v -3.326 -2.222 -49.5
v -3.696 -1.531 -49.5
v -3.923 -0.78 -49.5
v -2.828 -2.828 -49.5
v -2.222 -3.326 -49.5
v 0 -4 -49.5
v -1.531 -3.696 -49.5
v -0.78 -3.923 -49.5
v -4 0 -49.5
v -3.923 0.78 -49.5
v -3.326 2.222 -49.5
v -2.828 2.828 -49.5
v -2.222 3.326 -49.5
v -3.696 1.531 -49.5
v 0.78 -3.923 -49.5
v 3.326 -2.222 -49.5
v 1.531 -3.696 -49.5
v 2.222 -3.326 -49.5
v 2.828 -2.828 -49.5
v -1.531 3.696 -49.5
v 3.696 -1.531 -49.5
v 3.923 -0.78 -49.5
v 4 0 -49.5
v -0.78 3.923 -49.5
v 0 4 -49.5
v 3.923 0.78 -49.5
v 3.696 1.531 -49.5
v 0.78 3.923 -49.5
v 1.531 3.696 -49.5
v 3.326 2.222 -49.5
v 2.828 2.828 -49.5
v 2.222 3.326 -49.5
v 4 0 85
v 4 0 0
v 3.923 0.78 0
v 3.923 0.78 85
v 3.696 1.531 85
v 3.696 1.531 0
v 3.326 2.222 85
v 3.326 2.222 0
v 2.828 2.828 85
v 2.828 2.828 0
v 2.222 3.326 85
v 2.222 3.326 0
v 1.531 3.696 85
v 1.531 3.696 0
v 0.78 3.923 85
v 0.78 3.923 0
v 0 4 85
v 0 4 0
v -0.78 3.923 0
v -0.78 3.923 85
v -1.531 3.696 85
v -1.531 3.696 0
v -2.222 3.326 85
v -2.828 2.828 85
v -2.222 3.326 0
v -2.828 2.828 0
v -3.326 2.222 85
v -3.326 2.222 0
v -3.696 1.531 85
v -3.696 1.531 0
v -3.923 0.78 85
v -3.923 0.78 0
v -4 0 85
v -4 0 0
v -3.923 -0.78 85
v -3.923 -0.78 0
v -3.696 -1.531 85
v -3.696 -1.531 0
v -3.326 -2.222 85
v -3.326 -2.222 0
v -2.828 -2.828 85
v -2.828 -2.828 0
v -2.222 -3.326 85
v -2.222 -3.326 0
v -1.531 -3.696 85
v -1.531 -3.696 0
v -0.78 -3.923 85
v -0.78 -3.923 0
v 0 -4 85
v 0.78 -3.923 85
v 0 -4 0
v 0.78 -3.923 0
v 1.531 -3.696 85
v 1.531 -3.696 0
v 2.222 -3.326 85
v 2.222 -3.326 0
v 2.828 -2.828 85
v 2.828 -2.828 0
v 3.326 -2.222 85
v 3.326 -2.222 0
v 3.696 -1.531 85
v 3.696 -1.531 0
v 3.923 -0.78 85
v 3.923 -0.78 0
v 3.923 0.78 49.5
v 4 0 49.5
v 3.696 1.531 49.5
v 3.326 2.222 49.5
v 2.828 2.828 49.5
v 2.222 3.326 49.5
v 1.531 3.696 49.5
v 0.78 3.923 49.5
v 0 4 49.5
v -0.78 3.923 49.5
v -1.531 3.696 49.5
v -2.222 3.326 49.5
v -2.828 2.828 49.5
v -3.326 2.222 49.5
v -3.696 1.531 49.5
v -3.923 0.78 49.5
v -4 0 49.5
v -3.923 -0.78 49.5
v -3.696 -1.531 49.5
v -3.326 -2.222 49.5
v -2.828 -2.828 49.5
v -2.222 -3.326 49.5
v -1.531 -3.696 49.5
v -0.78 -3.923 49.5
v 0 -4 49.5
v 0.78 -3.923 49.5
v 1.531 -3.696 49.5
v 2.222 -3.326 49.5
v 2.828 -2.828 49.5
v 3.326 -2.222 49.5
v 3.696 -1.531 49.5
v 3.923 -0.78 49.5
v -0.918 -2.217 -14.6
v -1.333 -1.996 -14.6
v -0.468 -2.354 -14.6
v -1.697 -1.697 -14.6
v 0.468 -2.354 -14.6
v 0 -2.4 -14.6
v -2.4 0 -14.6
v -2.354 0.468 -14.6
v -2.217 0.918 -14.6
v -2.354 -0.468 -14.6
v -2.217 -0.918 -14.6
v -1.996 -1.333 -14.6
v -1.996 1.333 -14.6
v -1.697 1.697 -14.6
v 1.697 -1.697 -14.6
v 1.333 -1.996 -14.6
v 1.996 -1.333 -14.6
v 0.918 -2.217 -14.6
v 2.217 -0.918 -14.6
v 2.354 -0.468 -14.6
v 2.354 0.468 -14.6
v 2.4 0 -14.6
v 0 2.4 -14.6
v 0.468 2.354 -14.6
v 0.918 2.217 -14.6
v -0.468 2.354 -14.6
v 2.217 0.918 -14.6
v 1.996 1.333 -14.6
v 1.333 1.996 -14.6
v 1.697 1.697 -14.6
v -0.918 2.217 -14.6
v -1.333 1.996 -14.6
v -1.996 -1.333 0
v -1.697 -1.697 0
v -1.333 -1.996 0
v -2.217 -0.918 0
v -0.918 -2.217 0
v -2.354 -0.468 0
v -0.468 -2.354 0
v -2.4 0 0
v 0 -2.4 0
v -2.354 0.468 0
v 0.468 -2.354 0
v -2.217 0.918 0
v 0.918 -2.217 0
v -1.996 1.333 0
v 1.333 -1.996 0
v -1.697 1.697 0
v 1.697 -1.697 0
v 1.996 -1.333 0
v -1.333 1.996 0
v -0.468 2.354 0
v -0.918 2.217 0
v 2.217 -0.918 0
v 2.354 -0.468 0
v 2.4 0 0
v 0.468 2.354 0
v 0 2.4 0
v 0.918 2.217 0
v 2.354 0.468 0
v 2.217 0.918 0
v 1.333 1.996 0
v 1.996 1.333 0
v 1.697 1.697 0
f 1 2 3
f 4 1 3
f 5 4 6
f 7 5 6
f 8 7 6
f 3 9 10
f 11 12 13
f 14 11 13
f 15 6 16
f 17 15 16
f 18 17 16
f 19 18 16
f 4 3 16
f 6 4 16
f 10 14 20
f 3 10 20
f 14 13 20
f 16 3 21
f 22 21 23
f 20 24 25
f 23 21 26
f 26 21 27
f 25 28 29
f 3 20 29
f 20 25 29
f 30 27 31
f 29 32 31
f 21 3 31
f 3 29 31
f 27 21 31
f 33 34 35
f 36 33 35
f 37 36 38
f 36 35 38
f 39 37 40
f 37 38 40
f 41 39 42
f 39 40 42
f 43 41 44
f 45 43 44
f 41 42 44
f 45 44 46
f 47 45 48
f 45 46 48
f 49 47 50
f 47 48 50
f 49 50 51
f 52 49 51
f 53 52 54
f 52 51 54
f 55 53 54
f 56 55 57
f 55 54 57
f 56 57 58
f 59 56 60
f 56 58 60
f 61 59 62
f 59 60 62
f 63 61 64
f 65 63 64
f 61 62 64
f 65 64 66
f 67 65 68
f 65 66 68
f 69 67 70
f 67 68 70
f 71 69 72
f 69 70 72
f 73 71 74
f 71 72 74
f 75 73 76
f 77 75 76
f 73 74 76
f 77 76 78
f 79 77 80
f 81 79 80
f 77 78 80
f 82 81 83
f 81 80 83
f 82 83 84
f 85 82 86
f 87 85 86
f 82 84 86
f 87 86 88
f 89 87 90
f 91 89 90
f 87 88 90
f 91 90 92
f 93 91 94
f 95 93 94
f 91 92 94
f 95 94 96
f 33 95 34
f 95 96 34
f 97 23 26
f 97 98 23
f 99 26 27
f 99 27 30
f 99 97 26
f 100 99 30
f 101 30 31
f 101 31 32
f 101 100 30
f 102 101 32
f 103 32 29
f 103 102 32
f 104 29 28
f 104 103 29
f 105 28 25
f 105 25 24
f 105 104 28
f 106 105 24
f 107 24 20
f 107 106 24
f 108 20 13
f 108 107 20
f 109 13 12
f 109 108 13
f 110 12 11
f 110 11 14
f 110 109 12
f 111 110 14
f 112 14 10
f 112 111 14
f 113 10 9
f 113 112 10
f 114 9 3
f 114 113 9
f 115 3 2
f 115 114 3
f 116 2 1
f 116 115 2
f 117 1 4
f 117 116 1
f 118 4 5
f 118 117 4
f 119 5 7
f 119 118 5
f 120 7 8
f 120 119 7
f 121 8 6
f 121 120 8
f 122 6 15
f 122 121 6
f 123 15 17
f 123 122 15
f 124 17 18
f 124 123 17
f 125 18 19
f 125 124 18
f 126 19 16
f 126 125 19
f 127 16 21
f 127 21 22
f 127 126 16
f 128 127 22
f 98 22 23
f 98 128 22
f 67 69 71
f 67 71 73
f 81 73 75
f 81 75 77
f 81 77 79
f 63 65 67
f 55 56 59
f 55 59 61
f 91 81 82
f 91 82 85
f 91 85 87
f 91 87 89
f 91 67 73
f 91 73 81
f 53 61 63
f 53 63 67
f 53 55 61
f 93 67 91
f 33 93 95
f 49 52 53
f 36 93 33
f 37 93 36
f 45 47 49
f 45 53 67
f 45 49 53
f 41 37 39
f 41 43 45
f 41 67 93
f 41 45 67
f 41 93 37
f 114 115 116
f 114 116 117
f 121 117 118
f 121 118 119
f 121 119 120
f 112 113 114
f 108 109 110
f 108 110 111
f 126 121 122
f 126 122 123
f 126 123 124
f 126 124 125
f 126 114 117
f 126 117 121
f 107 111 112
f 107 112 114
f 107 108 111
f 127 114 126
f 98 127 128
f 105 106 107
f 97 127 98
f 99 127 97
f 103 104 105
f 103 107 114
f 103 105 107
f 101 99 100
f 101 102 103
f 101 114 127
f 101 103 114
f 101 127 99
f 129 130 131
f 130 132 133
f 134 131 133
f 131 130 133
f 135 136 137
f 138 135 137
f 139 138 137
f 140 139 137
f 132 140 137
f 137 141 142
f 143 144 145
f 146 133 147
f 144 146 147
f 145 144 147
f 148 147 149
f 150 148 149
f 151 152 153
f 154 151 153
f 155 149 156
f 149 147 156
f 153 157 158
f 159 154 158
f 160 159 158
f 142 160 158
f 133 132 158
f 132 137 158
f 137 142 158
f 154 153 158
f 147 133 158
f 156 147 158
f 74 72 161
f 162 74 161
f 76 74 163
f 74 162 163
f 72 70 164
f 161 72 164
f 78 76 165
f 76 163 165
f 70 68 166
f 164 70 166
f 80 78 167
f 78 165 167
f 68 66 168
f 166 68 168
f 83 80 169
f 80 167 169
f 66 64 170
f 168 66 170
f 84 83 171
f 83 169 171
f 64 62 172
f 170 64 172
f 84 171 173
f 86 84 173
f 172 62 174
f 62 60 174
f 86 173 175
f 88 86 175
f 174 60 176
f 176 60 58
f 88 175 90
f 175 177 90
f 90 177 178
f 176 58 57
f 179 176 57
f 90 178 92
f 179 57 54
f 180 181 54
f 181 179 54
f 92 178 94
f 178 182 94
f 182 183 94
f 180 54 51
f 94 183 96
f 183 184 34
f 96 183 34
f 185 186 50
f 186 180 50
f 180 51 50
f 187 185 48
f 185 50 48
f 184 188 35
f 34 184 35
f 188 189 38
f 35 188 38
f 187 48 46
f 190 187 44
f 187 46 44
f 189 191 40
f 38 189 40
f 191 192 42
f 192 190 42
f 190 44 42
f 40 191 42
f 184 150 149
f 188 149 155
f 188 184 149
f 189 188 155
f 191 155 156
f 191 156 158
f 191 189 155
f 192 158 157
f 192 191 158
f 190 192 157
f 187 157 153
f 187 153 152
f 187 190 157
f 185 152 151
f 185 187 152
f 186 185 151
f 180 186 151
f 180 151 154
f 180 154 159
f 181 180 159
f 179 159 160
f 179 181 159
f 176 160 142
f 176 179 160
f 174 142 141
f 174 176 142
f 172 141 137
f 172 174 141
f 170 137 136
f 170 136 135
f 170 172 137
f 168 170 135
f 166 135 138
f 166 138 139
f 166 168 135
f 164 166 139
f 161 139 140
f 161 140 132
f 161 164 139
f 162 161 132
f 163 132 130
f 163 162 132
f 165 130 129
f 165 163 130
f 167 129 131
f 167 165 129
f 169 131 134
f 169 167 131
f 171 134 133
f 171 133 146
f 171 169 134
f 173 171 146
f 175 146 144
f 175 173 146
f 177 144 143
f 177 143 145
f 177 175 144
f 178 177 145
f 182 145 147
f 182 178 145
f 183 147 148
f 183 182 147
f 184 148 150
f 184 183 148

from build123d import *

# Parameters (mm, degrees)
F0_R     = 4
F0_R_2   = 2.4
F1_DEPTH = 85
F2_DEPTH = 14.6
F3_DEPTH = 49.5


with BuildPart() as f1:
    # F0 (on Top) → F1 (new body)
    with BuildSketch(Plane.XY):
        Circle(F0_R)
        Circle(F0_R_2, mode=Mode.SUBTRACT)
        Circle(F0_R_2)
    extrude(amount=F1_DEPTH)

    # F0 (on Top) → F2 (join)
    with BuildSketch(Plane.XY):
        Circle(F0_R_2)
    extrude(amount=-F2_DEPTH)


with BuildPart() as f3:
    # F0 (on Top) → F3 (new body, symmetric)
    with BuildSketch(Plane.XY):
        Circle(F0_R)
        Circle(F0_R_2, mode=Mode.SUBTRACT)
        Circle(F0_R_2)
    extrude(amount=F3_DEPTH, both=True)


solid = Compound([f1.part, f3.part])
